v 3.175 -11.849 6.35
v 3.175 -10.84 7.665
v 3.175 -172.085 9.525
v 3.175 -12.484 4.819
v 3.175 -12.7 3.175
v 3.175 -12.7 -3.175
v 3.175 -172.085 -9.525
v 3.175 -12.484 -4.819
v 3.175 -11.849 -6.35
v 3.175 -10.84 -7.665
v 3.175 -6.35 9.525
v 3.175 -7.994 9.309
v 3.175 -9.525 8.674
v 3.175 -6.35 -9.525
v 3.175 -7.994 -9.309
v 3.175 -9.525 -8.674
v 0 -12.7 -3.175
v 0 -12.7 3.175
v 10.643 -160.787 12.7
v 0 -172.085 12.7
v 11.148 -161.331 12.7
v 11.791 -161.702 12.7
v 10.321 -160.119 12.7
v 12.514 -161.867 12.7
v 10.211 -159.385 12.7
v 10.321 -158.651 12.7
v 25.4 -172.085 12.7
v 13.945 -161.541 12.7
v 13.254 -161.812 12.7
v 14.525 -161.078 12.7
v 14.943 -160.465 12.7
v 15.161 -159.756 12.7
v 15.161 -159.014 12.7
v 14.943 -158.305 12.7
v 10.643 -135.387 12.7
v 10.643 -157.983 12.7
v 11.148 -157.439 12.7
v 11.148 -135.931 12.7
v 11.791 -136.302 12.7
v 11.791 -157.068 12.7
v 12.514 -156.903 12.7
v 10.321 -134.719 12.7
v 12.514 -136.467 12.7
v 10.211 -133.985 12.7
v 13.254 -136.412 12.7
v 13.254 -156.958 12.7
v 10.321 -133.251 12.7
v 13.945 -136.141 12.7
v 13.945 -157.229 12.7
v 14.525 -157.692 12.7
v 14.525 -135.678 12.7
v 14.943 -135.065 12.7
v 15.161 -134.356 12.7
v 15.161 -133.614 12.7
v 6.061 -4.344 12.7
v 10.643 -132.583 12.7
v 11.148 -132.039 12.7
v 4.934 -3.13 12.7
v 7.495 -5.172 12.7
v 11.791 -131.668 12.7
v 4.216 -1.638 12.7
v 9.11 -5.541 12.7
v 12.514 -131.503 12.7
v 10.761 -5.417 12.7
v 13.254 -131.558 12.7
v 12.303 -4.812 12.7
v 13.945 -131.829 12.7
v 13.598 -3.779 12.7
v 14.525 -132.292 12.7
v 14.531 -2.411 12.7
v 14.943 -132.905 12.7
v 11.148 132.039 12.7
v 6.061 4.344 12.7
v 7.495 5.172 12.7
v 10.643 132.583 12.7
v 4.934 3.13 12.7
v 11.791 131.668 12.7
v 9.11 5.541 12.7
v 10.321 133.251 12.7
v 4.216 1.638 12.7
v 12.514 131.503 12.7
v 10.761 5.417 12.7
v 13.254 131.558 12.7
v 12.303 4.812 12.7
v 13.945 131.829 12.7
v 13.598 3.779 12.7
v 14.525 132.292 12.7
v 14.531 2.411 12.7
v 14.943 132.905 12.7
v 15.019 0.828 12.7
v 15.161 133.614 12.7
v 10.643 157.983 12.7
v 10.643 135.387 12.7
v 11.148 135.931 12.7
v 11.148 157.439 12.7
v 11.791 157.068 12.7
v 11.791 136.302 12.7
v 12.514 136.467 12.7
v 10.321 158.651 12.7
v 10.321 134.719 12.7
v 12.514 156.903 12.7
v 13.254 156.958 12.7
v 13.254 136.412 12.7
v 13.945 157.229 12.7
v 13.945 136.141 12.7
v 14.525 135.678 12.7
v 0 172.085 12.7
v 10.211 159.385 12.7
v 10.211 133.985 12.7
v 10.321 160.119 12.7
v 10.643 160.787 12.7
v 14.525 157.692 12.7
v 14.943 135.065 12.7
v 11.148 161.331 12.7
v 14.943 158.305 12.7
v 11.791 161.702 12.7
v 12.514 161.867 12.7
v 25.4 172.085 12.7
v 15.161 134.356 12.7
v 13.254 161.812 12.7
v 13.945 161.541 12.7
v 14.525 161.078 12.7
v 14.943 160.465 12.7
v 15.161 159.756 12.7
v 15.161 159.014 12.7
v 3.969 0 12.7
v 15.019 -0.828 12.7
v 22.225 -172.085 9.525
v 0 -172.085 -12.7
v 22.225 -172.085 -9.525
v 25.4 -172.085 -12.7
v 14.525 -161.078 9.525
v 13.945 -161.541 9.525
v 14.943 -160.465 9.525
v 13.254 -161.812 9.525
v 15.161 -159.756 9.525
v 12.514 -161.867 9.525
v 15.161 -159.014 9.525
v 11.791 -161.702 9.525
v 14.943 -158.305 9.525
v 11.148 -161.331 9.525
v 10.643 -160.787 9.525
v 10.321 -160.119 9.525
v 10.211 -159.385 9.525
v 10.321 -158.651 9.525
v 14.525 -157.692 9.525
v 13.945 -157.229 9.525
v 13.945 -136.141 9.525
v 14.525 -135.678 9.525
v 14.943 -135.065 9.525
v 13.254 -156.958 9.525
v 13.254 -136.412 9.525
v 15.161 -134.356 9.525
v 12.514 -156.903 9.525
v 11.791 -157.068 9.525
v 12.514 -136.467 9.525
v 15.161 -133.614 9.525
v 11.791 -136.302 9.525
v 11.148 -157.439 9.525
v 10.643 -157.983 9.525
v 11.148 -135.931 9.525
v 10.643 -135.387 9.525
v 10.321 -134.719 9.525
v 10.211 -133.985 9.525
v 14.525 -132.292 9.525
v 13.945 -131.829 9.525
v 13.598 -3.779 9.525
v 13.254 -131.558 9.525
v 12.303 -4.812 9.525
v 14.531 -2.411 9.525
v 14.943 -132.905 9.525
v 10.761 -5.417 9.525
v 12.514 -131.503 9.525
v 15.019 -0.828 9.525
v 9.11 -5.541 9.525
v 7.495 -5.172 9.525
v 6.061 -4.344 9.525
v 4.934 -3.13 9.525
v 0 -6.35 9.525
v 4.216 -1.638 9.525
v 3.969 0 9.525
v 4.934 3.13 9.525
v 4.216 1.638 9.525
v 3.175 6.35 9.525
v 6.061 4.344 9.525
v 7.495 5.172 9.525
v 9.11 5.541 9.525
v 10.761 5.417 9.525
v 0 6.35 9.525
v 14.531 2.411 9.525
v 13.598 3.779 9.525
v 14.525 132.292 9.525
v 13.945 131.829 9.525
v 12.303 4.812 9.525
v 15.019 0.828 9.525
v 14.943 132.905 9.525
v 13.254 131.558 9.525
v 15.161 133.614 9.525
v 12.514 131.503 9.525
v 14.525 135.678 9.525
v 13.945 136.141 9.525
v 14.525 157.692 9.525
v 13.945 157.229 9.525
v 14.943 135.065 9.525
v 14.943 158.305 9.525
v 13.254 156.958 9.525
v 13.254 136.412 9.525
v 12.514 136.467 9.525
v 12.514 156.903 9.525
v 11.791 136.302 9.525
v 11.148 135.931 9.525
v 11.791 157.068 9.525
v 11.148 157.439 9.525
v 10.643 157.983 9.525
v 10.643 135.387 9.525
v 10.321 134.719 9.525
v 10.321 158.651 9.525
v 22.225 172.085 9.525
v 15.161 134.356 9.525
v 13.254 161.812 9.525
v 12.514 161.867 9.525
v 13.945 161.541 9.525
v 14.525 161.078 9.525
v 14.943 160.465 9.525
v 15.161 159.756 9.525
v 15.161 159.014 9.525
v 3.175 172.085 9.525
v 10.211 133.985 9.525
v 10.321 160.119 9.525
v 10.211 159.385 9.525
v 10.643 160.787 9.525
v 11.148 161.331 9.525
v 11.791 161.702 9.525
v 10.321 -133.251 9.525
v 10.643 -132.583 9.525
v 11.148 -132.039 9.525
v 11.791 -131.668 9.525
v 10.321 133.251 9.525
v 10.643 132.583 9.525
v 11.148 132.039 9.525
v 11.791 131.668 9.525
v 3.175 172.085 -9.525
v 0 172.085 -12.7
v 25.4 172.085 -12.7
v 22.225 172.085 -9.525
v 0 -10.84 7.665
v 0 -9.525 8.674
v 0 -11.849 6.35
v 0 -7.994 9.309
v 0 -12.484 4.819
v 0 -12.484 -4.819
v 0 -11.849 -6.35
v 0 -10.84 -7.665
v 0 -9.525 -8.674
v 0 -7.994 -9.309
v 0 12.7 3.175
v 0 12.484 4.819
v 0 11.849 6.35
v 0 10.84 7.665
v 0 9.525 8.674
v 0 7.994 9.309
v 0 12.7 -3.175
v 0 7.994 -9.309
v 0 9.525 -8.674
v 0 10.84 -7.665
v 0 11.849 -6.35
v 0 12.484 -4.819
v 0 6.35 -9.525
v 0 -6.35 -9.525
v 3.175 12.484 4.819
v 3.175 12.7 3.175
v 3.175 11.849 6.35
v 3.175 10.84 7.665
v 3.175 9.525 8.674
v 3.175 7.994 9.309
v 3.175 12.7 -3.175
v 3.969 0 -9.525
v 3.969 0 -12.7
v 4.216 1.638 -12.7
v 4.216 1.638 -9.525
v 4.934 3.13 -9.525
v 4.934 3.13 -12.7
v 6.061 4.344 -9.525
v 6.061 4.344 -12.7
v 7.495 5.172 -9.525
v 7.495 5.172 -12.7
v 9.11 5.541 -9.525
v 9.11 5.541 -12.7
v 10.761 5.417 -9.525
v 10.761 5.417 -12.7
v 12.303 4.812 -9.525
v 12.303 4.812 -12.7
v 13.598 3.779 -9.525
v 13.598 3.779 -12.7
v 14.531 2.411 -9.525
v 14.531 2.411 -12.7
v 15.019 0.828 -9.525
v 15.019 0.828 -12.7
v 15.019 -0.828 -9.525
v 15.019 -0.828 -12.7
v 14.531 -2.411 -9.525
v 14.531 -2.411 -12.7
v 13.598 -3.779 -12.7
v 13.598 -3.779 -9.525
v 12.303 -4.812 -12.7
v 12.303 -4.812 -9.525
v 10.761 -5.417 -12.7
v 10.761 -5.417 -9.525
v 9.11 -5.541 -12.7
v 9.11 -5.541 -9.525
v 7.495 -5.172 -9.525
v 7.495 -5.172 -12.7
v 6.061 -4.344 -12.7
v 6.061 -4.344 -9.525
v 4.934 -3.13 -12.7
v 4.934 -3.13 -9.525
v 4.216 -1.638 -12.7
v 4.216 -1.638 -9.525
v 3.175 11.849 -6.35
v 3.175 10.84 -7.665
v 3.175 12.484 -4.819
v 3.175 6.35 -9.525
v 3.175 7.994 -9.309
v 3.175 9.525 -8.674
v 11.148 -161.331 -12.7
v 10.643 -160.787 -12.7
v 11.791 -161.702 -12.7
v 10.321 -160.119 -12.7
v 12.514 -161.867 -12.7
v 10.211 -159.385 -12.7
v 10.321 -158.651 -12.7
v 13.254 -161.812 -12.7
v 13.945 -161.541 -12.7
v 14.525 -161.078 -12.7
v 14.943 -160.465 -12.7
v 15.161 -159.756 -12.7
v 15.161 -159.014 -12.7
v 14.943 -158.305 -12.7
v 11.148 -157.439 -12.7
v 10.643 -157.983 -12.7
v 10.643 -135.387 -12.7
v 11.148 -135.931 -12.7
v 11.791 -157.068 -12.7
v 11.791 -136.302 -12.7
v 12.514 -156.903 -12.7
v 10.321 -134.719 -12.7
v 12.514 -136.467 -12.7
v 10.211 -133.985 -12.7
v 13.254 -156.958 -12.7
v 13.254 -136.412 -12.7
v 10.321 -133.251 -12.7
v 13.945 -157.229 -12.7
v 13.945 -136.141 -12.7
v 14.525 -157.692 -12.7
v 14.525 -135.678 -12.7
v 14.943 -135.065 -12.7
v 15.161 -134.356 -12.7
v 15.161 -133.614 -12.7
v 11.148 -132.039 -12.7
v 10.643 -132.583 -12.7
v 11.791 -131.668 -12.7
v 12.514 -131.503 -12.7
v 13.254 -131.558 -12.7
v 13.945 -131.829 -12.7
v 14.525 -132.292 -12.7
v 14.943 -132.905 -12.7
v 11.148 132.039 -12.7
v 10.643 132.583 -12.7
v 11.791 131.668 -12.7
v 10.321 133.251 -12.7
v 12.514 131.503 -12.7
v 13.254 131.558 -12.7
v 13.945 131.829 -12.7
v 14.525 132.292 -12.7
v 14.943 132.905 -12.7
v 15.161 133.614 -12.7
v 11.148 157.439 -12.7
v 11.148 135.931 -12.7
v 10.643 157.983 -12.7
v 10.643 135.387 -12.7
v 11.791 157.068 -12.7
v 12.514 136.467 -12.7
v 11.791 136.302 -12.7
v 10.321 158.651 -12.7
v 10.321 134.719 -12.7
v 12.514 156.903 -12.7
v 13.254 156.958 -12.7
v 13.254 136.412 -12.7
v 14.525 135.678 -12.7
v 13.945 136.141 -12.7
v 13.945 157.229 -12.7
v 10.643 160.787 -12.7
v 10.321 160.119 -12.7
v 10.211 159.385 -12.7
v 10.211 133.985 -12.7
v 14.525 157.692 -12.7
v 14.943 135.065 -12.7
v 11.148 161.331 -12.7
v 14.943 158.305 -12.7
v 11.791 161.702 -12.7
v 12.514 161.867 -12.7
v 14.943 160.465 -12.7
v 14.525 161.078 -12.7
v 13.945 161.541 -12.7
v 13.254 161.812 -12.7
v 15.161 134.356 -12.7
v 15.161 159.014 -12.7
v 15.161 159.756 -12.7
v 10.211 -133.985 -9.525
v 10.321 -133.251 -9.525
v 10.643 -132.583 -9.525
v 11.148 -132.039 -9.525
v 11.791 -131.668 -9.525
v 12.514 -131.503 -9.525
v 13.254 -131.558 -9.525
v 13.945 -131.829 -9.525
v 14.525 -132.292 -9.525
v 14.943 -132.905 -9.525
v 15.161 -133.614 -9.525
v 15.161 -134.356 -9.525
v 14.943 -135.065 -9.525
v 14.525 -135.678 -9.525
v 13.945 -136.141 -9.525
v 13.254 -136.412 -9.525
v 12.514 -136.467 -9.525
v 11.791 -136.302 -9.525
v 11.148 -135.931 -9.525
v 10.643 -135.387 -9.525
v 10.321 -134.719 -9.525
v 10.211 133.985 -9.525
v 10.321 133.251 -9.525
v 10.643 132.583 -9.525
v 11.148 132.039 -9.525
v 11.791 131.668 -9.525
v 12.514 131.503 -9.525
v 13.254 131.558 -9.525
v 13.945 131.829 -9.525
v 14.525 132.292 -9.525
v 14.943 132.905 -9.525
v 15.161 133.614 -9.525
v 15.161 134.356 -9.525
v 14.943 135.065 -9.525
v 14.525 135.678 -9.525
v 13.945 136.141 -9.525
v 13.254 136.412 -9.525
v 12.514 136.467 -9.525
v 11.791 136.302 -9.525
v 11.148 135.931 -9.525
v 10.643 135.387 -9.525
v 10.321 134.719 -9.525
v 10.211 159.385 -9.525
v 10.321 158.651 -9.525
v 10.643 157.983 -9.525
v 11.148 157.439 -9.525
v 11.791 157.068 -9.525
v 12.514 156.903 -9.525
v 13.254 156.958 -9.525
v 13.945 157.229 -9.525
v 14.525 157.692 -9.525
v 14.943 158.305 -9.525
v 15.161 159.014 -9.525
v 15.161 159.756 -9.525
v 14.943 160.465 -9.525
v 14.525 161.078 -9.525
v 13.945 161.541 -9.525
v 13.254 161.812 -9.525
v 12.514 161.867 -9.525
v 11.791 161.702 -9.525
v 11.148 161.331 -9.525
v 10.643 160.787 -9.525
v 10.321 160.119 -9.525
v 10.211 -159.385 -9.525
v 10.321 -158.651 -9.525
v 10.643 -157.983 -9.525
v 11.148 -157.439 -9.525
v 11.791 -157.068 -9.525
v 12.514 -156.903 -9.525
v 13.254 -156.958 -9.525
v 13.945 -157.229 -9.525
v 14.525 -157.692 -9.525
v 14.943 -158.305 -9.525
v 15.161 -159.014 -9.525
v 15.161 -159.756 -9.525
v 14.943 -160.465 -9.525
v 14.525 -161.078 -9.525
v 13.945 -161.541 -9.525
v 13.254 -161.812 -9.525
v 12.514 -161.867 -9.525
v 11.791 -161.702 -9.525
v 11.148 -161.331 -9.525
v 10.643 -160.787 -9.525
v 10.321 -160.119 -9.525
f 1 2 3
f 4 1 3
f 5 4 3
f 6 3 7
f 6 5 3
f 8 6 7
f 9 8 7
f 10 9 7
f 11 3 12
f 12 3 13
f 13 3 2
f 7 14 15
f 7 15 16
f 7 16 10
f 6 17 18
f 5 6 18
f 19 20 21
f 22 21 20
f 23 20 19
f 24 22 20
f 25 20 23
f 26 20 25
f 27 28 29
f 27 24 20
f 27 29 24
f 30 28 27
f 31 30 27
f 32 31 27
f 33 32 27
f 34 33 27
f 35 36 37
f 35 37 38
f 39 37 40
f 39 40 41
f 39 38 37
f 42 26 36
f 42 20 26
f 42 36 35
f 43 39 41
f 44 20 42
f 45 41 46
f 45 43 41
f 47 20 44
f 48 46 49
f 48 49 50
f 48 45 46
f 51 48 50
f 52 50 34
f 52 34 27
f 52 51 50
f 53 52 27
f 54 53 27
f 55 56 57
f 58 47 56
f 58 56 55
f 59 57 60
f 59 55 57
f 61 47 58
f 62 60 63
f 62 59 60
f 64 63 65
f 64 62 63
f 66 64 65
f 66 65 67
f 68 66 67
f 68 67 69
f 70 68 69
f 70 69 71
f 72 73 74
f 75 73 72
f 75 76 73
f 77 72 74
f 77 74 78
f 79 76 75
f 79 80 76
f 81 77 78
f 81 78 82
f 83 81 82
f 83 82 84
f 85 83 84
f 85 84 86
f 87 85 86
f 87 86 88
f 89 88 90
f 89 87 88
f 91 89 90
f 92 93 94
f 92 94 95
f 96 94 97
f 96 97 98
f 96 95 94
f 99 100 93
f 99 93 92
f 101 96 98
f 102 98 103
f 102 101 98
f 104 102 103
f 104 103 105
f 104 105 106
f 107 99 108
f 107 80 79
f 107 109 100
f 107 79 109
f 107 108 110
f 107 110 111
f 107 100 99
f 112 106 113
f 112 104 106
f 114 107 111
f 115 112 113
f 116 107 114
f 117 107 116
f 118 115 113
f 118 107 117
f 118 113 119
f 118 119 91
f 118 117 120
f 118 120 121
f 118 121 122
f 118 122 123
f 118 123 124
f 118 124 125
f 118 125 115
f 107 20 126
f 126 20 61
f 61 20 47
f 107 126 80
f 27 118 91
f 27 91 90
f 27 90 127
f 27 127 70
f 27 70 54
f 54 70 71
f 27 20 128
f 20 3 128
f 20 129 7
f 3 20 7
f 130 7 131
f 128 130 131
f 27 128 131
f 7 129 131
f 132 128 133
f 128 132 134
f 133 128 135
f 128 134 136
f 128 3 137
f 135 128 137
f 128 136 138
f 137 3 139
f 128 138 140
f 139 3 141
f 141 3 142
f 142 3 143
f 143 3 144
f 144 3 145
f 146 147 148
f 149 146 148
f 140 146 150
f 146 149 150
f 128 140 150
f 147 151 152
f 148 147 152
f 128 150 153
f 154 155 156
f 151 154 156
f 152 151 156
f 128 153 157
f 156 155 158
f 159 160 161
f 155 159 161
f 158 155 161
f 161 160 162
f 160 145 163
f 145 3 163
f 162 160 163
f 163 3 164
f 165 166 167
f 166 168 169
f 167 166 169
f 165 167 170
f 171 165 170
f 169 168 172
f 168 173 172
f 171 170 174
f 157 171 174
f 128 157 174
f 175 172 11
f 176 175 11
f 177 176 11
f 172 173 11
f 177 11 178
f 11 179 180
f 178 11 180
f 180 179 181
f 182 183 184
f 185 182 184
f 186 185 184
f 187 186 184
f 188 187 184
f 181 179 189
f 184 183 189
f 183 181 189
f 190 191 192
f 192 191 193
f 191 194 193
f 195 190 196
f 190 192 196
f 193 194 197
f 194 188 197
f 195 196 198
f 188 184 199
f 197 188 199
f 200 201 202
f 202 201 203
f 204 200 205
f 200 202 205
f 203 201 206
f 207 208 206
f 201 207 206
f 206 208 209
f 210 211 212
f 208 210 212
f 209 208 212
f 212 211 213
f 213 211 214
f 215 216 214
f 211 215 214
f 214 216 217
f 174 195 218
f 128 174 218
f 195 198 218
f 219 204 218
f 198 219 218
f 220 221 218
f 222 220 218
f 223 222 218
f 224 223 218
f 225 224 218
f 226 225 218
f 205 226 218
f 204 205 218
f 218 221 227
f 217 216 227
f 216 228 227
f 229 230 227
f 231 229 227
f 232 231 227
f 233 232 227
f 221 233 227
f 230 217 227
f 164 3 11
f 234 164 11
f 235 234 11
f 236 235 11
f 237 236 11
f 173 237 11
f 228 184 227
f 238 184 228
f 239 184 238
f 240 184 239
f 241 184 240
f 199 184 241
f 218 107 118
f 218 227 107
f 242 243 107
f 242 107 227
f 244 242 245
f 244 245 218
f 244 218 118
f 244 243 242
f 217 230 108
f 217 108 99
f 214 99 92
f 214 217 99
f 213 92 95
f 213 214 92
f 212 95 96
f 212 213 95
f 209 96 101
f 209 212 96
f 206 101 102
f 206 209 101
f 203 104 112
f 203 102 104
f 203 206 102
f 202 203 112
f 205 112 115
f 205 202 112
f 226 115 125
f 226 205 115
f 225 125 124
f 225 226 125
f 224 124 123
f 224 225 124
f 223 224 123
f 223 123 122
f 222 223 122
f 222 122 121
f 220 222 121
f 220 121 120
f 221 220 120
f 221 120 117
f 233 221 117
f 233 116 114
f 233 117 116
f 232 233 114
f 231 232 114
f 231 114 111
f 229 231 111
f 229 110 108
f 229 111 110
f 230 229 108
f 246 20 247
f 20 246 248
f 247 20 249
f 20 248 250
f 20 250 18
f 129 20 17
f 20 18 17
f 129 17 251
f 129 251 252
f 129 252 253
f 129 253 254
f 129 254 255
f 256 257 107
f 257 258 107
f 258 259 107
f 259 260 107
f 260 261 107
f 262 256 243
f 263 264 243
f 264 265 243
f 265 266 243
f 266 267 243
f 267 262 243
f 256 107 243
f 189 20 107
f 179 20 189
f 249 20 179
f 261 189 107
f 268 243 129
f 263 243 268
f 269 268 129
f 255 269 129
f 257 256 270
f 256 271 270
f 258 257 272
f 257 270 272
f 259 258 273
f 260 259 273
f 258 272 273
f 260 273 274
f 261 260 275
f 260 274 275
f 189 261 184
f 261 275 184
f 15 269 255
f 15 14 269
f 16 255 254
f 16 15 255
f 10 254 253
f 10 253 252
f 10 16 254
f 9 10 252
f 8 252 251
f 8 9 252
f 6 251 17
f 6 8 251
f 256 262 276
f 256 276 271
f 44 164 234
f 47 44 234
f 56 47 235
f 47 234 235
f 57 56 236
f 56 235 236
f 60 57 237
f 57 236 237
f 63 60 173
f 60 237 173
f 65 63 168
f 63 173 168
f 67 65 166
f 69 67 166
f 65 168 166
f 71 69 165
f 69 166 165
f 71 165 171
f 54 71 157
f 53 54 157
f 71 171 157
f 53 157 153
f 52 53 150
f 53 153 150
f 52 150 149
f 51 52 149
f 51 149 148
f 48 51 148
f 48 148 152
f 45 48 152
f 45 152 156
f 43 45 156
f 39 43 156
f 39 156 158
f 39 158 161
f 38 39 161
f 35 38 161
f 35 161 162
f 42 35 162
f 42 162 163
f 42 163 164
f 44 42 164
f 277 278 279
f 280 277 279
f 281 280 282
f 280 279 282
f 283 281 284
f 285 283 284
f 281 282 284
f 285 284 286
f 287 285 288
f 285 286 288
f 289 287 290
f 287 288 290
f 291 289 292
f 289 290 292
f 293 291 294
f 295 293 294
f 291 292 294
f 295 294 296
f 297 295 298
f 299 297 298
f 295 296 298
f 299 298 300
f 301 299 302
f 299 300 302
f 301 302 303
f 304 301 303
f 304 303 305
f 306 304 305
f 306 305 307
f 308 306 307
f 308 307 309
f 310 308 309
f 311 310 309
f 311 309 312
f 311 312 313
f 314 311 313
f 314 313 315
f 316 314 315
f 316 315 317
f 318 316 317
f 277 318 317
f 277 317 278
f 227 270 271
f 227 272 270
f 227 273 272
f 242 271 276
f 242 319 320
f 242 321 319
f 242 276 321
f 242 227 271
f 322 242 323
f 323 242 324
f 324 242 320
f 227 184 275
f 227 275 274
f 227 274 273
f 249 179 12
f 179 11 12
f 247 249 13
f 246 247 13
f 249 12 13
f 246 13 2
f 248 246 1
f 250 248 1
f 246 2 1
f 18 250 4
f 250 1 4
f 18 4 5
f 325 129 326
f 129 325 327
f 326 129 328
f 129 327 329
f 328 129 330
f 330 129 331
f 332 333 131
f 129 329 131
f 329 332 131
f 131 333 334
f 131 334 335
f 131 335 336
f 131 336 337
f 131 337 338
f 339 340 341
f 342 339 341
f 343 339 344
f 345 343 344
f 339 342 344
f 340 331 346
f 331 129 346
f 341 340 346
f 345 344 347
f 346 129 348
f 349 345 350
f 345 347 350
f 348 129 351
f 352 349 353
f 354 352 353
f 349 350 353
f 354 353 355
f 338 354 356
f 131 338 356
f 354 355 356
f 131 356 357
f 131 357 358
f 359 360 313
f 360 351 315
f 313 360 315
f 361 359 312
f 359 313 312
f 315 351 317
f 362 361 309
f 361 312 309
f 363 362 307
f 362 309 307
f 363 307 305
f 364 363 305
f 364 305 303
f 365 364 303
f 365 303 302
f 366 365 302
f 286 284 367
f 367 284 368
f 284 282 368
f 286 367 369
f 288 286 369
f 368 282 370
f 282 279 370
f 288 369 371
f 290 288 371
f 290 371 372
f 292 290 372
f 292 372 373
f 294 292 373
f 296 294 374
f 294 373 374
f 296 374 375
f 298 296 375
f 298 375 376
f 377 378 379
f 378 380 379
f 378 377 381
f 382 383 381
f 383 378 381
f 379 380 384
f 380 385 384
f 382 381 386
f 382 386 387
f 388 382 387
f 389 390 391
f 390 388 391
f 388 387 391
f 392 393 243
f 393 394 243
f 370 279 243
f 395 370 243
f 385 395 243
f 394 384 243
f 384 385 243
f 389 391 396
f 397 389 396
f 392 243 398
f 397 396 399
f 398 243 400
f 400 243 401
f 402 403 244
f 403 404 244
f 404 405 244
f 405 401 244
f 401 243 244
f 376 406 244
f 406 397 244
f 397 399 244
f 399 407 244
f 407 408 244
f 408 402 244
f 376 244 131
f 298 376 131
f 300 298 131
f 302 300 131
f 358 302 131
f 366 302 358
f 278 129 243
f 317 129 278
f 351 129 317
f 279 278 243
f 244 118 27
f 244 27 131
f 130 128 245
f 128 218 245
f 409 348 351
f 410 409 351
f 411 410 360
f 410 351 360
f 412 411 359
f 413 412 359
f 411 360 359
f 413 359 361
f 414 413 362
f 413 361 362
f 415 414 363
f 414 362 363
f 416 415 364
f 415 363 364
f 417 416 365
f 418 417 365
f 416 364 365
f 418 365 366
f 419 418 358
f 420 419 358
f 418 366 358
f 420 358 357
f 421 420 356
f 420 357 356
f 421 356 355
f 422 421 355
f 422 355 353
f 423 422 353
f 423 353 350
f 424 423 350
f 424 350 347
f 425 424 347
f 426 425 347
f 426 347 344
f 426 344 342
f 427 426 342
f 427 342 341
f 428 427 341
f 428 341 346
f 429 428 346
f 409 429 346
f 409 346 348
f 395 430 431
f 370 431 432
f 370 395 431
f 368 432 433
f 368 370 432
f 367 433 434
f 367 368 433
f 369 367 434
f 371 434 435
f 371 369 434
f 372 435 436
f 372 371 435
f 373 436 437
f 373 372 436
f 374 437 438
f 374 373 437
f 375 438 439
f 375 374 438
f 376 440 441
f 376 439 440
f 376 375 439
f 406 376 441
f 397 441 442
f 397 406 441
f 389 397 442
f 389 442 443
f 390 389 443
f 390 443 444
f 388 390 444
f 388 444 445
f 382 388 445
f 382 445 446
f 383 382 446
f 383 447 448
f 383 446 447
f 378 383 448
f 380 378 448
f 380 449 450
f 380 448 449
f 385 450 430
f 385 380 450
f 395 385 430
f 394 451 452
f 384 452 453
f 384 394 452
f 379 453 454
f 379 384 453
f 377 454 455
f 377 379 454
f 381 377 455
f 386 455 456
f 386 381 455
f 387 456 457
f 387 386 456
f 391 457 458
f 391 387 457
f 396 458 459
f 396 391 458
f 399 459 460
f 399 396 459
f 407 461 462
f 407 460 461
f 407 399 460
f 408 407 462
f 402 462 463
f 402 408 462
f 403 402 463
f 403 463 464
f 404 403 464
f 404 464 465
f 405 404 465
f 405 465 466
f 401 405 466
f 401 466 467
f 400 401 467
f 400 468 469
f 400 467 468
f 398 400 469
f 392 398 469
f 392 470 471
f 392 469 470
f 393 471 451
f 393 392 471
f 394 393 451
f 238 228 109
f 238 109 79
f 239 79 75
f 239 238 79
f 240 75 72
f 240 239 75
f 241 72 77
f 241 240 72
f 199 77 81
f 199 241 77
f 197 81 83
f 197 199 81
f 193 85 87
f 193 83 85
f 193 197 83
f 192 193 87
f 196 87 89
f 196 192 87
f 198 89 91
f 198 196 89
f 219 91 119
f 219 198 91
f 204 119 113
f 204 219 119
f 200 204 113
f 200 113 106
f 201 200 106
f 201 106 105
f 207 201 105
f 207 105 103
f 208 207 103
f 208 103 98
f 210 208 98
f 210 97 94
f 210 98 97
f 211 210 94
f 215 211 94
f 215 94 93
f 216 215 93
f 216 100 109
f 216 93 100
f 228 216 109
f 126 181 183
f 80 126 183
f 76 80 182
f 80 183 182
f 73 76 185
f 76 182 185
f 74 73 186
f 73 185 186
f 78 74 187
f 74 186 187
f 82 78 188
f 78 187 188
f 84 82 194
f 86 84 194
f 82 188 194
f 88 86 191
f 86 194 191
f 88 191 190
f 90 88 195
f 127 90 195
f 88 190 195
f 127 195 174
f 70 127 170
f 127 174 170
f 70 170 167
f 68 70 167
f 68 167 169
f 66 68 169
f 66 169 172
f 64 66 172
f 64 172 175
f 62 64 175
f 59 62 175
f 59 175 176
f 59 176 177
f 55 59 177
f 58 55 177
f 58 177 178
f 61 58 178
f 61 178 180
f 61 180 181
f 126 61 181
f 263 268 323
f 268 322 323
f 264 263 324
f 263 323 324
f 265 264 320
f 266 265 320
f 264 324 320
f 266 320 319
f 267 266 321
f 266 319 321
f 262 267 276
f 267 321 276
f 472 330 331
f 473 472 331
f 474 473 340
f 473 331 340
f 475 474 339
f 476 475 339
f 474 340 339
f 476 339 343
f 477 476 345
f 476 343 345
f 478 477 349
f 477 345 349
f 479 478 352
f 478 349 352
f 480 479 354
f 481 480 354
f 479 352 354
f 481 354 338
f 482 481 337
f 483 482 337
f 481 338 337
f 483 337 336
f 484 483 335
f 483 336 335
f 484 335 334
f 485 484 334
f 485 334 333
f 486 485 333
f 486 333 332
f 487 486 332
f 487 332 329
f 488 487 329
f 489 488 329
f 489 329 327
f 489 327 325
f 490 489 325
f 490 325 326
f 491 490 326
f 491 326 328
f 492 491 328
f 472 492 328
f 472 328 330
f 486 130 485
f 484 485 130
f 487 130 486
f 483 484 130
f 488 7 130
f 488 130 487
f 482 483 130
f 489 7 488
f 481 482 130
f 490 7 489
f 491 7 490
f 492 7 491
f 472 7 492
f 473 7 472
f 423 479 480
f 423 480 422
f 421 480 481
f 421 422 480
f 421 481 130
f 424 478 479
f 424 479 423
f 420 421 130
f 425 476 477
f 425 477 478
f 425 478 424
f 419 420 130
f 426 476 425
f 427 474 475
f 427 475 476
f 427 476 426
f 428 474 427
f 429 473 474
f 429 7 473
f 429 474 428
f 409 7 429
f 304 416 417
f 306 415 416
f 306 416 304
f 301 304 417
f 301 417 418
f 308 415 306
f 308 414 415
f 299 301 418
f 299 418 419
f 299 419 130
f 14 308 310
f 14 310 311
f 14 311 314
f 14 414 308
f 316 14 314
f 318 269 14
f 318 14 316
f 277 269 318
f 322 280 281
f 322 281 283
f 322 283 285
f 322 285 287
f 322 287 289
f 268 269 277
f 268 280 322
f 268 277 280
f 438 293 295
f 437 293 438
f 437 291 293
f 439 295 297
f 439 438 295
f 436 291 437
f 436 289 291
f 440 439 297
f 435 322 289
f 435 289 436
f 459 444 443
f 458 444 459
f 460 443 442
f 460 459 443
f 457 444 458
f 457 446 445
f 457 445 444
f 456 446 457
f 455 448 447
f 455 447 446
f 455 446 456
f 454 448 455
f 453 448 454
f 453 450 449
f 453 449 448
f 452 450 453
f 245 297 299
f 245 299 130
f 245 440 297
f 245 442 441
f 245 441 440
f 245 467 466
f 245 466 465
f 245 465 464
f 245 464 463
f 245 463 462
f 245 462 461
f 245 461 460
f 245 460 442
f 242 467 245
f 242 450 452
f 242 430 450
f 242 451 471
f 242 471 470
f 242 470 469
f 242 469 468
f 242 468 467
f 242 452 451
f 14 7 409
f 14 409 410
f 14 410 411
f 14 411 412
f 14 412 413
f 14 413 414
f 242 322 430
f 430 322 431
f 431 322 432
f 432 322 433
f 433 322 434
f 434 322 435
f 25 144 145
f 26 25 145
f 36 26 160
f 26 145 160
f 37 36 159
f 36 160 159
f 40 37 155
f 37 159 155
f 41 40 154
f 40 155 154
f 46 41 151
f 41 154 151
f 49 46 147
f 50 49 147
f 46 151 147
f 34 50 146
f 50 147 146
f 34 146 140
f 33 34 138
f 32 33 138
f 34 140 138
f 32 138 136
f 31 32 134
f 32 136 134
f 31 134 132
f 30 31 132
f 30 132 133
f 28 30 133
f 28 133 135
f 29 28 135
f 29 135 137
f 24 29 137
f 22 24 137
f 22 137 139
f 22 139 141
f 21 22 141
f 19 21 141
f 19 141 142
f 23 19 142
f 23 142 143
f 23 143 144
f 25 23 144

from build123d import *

# Parameters (mm, degrees)
SKETCH1_W           = 25.4
SKETCH1_H           = 25.4
SKETCH1_W_2         = 19.05
SKETCH1_H_2         = 19.05
BOSS_EXTRUDE1_DEPTH = 172.085
SKETCH2_W           = 19.05
SKETCH2_H           = 25.4
CUT_EXTRUDE1_DEPTH  = 3.175
SKETCH3_R           = 2.4892
SKETCH3_R_2         = 5.55625
CUT_EXTRUDE2_DEPTH  = 26.4
FILLET1_R           = 6.35


with BuildPart() as part:
    # Sketch1 → Boss-Extrude1 (new body, symmetric)
    with BuildSketch(Plane(origin=(0, 0, 0), x_dir=(1, 0, 0), z_dir=(0, 1, 0))):
        with Locations((12.7, 0)):
            Rectangle(SKETCH1_W, SKETCH1_H)
        with Locations((12.7, 0)):
            Rectangle(SKETCH1_W_2, SKETCH1_H_2, mode=Mode.SUBTRACT)
    extrude(amount=BOSS_EXTRUDE1_DEPTH, both=True)

    # Sketch2 → Cut-Extrude1 (cut)
    with BuildSketch(Plane.ZY):
        Rectangle(SKETCH2_W, SKETCH2_H)
    extrude(amount=-CUT_EXTRUDE1_DEPTH, mode=Mode.SUBTRACT)

    # Sketch3 → Cut-Extrude2 (cut, through all)
    with BuildSketch(Plane(origin=(0, 0, -12.7), x_dir=(-1, 0, 0), z_dir=(0, 0, -1))):
        with Locations((-12.7, -159.385)):
            Circle(SKETCH3_R)
        with Locations((-12.7, -133.985)):
            Circle(SKETCH3_R)
        with Locations((-9.525, 0)):
            Circle(SKETCH3_R_2)
    cut_extrude2 = extrude(amount=-CUT_EXTRUDE2_DEPTH, mode=Mode.SUBTRACT)

    # Mirror1: Cut-Extrude2 across plane
    add(cut_extrude2.mirror(Plane.ZX), mode=Mode.SUBTRACT)

    # Fillet1
    fillet1_edges = [part.edges().sort_by_distance(p)[0] for p in [
        (1.5875, 12.7, -9.525),
        (1.5875, -12.7, -9.525),
        (1.5875, -12.7, 9.525),
        (1.5875, 12.7, 9.525),
    ]]
    fillet(fillet1_edges, radius=FILLET1_R)


solid = part.part
